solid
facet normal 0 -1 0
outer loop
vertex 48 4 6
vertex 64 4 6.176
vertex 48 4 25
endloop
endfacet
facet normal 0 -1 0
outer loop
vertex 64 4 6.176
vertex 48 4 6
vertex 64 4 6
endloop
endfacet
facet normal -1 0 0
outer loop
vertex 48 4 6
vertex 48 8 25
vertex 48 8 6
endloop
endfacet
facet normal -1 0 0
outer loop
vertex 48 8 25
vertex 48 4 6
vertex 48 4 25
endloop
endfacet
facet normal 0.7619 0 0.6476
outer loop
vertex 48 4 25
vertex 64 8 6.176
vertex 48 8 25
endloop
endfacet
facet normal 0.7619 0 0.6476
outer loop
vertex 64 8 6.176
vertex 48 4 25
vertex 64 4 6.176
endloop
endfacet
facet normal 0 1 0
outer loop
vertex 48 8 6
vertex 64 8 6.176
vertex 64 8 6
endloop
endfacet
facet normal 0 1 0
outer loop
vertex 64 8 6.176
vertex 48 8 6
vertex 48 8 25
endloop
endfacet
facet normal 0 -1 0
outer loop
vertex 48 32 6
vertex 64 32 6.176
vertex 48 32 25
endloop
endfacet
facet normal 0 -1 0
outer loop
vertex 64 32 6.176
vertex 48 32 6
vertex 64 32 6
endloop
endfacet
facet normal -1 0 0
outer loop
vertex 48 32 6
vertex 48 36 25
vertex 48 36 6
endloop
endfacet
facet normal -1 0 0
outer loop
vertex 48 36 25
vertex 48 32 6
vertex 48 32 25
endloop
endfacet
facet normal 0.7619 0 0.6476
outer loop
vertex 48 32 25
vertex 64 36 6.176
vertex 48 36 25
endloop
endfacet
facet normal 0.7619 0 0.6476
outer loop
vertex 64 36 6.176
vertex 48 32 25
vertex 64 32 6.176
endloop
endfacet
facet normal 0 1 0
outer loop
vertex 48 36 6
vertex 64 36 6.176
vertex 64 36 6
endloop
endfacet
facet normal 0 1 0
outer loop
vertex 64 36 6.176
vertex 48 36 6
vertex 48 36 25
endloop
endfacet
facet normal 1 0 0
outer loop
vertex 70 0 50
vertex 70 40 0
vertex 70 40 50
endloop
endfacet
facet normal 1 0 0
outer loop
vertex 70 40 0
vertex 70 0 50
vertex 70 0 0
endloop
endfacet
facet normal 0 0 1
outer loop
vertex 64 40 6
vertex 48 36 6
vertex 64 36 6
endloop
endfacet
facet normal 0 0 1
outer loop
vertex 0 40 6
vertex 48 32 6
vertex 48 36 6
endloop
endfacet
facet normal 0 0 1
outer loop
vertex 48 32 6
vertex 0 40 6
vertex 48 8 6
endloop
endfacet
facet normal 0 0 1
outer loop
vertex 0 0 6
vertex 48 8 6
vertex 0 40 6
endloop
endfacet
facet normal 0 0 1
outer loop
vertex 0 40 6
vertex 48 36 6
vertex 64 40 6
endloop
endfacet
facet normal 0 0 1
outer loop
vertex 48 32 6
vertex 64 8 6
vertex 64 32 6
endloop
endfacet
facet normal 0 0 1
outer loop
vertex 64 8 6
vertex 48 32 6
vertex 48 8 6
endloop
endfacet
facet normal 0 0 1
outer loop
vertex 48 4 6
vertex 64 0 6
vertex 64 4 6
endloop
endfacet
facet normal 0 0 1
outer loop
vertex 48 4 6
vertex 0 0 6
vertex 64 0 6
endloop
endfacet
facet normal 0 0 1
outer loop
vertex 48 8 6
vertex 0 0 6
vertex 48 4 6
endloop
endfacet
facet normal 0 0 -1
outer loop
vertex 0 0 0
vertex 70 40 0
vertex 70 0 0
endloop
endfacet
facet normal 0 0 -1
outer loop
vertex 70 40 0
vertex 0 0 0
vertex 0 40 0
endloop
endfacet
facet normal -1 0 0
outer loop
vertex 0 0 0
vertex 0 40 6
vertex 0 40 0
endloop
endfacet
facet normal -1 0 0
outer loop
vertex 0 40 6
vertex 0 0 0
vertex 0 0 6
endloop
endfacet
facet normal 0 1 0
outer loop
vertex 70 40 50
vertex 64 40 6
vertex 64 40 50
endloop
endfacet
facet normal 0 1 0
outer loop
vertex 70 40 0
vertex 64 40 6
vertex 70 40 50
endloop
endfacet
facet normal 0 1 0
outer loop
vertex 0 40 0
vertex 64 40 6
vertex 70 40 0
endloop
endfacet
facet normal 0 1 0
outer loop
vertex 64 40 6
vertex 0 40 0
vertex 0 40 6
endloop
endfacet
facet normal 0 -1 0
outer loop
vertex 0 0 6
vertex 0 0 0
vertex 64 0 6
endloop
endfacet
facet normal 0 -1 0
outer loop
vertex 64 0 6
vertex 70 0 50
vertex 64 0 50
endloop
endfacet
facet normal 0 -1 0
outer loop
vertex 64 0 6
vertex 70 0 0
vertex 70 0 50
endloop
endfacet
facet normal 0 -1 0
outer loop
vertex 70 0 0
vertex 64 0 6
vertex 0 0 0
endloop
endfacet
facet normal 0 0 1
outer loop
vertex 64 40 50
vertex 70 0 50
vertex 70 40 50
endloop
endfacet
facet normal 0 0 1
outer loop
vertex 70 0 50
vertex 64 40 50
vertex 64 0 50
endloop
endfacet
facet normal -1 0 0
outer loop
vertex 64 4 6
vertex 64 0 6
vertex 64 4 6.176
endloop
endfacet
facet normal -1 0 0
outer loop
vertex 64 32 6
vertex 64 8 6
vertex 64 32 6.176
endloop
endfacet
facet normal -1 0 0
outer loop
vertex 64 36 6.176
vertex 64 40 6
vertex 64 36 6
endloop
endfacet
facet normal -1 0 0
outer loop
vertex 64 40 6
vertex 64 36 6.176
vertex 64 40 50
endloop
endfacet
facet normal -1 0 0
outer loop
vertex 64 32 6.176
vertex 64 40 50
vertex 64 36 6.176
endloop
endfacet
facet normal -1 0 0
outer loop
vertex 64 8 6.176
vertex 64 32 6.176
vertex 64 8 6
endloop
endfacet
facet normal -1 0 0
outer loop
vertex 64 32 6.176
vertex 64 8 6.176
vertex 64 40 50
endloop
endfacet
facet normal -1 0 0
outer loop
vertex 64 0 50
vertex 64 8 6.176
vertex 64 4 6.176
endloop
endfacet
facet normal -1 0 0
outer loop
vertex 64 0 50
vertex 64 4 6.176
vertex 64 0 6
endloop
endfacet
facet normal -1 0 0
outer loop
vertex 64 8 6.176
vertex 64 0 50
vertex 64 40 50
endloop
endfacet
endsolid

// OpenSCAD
$fn = 32;

// ----------------------------------------------------------------------
// Rib bracket: 2-gusset L bracket
// ----------------------------------------------------------------------

// --- parameters (mm) ---
base_l = 70;              // foot length, X
base_w = 40;              // foot width, Y
base_t = 6;               // foot thickness
plate_t = 6;              // upright plate thickness
plate_h = 50;             // overall height
gus_l = 16;               // gusset leg along the foot
gus_h = 20;               // gusset height
gus_t = 4;                // gusset thickness
gus_edge = 4;             // gusset margin from the foot edge
n_gus = 2;                // gusset count
fit_tol = 0.1;            // tolerance for press fits, mm
free_tol = 0.3;           // tolerance for clearance fits, mm

gus_pitch = (base_w - 2 * gus_edge - gus_t) / (n_gus - 1);  // gusset pitch

union() {
  cube([base_l, base_w, base_t]);
  translate([base_l - plate_t, 0, base_t - 1])
    cube([plate_t, base_w, plate_h - base_t + 1]);
  for (i = [0 : n_gus - 1])
    translate([base_l - plate_t - gus_l, gus_edge + i * gus_pitch, base_t - 1])
      rotate([-90, 0, 0])
        linear_extrude(height = gus_t)
          polygon(points = [[0, 0], [gus_l + 1, 0], [0, -gus_h]]);
}
